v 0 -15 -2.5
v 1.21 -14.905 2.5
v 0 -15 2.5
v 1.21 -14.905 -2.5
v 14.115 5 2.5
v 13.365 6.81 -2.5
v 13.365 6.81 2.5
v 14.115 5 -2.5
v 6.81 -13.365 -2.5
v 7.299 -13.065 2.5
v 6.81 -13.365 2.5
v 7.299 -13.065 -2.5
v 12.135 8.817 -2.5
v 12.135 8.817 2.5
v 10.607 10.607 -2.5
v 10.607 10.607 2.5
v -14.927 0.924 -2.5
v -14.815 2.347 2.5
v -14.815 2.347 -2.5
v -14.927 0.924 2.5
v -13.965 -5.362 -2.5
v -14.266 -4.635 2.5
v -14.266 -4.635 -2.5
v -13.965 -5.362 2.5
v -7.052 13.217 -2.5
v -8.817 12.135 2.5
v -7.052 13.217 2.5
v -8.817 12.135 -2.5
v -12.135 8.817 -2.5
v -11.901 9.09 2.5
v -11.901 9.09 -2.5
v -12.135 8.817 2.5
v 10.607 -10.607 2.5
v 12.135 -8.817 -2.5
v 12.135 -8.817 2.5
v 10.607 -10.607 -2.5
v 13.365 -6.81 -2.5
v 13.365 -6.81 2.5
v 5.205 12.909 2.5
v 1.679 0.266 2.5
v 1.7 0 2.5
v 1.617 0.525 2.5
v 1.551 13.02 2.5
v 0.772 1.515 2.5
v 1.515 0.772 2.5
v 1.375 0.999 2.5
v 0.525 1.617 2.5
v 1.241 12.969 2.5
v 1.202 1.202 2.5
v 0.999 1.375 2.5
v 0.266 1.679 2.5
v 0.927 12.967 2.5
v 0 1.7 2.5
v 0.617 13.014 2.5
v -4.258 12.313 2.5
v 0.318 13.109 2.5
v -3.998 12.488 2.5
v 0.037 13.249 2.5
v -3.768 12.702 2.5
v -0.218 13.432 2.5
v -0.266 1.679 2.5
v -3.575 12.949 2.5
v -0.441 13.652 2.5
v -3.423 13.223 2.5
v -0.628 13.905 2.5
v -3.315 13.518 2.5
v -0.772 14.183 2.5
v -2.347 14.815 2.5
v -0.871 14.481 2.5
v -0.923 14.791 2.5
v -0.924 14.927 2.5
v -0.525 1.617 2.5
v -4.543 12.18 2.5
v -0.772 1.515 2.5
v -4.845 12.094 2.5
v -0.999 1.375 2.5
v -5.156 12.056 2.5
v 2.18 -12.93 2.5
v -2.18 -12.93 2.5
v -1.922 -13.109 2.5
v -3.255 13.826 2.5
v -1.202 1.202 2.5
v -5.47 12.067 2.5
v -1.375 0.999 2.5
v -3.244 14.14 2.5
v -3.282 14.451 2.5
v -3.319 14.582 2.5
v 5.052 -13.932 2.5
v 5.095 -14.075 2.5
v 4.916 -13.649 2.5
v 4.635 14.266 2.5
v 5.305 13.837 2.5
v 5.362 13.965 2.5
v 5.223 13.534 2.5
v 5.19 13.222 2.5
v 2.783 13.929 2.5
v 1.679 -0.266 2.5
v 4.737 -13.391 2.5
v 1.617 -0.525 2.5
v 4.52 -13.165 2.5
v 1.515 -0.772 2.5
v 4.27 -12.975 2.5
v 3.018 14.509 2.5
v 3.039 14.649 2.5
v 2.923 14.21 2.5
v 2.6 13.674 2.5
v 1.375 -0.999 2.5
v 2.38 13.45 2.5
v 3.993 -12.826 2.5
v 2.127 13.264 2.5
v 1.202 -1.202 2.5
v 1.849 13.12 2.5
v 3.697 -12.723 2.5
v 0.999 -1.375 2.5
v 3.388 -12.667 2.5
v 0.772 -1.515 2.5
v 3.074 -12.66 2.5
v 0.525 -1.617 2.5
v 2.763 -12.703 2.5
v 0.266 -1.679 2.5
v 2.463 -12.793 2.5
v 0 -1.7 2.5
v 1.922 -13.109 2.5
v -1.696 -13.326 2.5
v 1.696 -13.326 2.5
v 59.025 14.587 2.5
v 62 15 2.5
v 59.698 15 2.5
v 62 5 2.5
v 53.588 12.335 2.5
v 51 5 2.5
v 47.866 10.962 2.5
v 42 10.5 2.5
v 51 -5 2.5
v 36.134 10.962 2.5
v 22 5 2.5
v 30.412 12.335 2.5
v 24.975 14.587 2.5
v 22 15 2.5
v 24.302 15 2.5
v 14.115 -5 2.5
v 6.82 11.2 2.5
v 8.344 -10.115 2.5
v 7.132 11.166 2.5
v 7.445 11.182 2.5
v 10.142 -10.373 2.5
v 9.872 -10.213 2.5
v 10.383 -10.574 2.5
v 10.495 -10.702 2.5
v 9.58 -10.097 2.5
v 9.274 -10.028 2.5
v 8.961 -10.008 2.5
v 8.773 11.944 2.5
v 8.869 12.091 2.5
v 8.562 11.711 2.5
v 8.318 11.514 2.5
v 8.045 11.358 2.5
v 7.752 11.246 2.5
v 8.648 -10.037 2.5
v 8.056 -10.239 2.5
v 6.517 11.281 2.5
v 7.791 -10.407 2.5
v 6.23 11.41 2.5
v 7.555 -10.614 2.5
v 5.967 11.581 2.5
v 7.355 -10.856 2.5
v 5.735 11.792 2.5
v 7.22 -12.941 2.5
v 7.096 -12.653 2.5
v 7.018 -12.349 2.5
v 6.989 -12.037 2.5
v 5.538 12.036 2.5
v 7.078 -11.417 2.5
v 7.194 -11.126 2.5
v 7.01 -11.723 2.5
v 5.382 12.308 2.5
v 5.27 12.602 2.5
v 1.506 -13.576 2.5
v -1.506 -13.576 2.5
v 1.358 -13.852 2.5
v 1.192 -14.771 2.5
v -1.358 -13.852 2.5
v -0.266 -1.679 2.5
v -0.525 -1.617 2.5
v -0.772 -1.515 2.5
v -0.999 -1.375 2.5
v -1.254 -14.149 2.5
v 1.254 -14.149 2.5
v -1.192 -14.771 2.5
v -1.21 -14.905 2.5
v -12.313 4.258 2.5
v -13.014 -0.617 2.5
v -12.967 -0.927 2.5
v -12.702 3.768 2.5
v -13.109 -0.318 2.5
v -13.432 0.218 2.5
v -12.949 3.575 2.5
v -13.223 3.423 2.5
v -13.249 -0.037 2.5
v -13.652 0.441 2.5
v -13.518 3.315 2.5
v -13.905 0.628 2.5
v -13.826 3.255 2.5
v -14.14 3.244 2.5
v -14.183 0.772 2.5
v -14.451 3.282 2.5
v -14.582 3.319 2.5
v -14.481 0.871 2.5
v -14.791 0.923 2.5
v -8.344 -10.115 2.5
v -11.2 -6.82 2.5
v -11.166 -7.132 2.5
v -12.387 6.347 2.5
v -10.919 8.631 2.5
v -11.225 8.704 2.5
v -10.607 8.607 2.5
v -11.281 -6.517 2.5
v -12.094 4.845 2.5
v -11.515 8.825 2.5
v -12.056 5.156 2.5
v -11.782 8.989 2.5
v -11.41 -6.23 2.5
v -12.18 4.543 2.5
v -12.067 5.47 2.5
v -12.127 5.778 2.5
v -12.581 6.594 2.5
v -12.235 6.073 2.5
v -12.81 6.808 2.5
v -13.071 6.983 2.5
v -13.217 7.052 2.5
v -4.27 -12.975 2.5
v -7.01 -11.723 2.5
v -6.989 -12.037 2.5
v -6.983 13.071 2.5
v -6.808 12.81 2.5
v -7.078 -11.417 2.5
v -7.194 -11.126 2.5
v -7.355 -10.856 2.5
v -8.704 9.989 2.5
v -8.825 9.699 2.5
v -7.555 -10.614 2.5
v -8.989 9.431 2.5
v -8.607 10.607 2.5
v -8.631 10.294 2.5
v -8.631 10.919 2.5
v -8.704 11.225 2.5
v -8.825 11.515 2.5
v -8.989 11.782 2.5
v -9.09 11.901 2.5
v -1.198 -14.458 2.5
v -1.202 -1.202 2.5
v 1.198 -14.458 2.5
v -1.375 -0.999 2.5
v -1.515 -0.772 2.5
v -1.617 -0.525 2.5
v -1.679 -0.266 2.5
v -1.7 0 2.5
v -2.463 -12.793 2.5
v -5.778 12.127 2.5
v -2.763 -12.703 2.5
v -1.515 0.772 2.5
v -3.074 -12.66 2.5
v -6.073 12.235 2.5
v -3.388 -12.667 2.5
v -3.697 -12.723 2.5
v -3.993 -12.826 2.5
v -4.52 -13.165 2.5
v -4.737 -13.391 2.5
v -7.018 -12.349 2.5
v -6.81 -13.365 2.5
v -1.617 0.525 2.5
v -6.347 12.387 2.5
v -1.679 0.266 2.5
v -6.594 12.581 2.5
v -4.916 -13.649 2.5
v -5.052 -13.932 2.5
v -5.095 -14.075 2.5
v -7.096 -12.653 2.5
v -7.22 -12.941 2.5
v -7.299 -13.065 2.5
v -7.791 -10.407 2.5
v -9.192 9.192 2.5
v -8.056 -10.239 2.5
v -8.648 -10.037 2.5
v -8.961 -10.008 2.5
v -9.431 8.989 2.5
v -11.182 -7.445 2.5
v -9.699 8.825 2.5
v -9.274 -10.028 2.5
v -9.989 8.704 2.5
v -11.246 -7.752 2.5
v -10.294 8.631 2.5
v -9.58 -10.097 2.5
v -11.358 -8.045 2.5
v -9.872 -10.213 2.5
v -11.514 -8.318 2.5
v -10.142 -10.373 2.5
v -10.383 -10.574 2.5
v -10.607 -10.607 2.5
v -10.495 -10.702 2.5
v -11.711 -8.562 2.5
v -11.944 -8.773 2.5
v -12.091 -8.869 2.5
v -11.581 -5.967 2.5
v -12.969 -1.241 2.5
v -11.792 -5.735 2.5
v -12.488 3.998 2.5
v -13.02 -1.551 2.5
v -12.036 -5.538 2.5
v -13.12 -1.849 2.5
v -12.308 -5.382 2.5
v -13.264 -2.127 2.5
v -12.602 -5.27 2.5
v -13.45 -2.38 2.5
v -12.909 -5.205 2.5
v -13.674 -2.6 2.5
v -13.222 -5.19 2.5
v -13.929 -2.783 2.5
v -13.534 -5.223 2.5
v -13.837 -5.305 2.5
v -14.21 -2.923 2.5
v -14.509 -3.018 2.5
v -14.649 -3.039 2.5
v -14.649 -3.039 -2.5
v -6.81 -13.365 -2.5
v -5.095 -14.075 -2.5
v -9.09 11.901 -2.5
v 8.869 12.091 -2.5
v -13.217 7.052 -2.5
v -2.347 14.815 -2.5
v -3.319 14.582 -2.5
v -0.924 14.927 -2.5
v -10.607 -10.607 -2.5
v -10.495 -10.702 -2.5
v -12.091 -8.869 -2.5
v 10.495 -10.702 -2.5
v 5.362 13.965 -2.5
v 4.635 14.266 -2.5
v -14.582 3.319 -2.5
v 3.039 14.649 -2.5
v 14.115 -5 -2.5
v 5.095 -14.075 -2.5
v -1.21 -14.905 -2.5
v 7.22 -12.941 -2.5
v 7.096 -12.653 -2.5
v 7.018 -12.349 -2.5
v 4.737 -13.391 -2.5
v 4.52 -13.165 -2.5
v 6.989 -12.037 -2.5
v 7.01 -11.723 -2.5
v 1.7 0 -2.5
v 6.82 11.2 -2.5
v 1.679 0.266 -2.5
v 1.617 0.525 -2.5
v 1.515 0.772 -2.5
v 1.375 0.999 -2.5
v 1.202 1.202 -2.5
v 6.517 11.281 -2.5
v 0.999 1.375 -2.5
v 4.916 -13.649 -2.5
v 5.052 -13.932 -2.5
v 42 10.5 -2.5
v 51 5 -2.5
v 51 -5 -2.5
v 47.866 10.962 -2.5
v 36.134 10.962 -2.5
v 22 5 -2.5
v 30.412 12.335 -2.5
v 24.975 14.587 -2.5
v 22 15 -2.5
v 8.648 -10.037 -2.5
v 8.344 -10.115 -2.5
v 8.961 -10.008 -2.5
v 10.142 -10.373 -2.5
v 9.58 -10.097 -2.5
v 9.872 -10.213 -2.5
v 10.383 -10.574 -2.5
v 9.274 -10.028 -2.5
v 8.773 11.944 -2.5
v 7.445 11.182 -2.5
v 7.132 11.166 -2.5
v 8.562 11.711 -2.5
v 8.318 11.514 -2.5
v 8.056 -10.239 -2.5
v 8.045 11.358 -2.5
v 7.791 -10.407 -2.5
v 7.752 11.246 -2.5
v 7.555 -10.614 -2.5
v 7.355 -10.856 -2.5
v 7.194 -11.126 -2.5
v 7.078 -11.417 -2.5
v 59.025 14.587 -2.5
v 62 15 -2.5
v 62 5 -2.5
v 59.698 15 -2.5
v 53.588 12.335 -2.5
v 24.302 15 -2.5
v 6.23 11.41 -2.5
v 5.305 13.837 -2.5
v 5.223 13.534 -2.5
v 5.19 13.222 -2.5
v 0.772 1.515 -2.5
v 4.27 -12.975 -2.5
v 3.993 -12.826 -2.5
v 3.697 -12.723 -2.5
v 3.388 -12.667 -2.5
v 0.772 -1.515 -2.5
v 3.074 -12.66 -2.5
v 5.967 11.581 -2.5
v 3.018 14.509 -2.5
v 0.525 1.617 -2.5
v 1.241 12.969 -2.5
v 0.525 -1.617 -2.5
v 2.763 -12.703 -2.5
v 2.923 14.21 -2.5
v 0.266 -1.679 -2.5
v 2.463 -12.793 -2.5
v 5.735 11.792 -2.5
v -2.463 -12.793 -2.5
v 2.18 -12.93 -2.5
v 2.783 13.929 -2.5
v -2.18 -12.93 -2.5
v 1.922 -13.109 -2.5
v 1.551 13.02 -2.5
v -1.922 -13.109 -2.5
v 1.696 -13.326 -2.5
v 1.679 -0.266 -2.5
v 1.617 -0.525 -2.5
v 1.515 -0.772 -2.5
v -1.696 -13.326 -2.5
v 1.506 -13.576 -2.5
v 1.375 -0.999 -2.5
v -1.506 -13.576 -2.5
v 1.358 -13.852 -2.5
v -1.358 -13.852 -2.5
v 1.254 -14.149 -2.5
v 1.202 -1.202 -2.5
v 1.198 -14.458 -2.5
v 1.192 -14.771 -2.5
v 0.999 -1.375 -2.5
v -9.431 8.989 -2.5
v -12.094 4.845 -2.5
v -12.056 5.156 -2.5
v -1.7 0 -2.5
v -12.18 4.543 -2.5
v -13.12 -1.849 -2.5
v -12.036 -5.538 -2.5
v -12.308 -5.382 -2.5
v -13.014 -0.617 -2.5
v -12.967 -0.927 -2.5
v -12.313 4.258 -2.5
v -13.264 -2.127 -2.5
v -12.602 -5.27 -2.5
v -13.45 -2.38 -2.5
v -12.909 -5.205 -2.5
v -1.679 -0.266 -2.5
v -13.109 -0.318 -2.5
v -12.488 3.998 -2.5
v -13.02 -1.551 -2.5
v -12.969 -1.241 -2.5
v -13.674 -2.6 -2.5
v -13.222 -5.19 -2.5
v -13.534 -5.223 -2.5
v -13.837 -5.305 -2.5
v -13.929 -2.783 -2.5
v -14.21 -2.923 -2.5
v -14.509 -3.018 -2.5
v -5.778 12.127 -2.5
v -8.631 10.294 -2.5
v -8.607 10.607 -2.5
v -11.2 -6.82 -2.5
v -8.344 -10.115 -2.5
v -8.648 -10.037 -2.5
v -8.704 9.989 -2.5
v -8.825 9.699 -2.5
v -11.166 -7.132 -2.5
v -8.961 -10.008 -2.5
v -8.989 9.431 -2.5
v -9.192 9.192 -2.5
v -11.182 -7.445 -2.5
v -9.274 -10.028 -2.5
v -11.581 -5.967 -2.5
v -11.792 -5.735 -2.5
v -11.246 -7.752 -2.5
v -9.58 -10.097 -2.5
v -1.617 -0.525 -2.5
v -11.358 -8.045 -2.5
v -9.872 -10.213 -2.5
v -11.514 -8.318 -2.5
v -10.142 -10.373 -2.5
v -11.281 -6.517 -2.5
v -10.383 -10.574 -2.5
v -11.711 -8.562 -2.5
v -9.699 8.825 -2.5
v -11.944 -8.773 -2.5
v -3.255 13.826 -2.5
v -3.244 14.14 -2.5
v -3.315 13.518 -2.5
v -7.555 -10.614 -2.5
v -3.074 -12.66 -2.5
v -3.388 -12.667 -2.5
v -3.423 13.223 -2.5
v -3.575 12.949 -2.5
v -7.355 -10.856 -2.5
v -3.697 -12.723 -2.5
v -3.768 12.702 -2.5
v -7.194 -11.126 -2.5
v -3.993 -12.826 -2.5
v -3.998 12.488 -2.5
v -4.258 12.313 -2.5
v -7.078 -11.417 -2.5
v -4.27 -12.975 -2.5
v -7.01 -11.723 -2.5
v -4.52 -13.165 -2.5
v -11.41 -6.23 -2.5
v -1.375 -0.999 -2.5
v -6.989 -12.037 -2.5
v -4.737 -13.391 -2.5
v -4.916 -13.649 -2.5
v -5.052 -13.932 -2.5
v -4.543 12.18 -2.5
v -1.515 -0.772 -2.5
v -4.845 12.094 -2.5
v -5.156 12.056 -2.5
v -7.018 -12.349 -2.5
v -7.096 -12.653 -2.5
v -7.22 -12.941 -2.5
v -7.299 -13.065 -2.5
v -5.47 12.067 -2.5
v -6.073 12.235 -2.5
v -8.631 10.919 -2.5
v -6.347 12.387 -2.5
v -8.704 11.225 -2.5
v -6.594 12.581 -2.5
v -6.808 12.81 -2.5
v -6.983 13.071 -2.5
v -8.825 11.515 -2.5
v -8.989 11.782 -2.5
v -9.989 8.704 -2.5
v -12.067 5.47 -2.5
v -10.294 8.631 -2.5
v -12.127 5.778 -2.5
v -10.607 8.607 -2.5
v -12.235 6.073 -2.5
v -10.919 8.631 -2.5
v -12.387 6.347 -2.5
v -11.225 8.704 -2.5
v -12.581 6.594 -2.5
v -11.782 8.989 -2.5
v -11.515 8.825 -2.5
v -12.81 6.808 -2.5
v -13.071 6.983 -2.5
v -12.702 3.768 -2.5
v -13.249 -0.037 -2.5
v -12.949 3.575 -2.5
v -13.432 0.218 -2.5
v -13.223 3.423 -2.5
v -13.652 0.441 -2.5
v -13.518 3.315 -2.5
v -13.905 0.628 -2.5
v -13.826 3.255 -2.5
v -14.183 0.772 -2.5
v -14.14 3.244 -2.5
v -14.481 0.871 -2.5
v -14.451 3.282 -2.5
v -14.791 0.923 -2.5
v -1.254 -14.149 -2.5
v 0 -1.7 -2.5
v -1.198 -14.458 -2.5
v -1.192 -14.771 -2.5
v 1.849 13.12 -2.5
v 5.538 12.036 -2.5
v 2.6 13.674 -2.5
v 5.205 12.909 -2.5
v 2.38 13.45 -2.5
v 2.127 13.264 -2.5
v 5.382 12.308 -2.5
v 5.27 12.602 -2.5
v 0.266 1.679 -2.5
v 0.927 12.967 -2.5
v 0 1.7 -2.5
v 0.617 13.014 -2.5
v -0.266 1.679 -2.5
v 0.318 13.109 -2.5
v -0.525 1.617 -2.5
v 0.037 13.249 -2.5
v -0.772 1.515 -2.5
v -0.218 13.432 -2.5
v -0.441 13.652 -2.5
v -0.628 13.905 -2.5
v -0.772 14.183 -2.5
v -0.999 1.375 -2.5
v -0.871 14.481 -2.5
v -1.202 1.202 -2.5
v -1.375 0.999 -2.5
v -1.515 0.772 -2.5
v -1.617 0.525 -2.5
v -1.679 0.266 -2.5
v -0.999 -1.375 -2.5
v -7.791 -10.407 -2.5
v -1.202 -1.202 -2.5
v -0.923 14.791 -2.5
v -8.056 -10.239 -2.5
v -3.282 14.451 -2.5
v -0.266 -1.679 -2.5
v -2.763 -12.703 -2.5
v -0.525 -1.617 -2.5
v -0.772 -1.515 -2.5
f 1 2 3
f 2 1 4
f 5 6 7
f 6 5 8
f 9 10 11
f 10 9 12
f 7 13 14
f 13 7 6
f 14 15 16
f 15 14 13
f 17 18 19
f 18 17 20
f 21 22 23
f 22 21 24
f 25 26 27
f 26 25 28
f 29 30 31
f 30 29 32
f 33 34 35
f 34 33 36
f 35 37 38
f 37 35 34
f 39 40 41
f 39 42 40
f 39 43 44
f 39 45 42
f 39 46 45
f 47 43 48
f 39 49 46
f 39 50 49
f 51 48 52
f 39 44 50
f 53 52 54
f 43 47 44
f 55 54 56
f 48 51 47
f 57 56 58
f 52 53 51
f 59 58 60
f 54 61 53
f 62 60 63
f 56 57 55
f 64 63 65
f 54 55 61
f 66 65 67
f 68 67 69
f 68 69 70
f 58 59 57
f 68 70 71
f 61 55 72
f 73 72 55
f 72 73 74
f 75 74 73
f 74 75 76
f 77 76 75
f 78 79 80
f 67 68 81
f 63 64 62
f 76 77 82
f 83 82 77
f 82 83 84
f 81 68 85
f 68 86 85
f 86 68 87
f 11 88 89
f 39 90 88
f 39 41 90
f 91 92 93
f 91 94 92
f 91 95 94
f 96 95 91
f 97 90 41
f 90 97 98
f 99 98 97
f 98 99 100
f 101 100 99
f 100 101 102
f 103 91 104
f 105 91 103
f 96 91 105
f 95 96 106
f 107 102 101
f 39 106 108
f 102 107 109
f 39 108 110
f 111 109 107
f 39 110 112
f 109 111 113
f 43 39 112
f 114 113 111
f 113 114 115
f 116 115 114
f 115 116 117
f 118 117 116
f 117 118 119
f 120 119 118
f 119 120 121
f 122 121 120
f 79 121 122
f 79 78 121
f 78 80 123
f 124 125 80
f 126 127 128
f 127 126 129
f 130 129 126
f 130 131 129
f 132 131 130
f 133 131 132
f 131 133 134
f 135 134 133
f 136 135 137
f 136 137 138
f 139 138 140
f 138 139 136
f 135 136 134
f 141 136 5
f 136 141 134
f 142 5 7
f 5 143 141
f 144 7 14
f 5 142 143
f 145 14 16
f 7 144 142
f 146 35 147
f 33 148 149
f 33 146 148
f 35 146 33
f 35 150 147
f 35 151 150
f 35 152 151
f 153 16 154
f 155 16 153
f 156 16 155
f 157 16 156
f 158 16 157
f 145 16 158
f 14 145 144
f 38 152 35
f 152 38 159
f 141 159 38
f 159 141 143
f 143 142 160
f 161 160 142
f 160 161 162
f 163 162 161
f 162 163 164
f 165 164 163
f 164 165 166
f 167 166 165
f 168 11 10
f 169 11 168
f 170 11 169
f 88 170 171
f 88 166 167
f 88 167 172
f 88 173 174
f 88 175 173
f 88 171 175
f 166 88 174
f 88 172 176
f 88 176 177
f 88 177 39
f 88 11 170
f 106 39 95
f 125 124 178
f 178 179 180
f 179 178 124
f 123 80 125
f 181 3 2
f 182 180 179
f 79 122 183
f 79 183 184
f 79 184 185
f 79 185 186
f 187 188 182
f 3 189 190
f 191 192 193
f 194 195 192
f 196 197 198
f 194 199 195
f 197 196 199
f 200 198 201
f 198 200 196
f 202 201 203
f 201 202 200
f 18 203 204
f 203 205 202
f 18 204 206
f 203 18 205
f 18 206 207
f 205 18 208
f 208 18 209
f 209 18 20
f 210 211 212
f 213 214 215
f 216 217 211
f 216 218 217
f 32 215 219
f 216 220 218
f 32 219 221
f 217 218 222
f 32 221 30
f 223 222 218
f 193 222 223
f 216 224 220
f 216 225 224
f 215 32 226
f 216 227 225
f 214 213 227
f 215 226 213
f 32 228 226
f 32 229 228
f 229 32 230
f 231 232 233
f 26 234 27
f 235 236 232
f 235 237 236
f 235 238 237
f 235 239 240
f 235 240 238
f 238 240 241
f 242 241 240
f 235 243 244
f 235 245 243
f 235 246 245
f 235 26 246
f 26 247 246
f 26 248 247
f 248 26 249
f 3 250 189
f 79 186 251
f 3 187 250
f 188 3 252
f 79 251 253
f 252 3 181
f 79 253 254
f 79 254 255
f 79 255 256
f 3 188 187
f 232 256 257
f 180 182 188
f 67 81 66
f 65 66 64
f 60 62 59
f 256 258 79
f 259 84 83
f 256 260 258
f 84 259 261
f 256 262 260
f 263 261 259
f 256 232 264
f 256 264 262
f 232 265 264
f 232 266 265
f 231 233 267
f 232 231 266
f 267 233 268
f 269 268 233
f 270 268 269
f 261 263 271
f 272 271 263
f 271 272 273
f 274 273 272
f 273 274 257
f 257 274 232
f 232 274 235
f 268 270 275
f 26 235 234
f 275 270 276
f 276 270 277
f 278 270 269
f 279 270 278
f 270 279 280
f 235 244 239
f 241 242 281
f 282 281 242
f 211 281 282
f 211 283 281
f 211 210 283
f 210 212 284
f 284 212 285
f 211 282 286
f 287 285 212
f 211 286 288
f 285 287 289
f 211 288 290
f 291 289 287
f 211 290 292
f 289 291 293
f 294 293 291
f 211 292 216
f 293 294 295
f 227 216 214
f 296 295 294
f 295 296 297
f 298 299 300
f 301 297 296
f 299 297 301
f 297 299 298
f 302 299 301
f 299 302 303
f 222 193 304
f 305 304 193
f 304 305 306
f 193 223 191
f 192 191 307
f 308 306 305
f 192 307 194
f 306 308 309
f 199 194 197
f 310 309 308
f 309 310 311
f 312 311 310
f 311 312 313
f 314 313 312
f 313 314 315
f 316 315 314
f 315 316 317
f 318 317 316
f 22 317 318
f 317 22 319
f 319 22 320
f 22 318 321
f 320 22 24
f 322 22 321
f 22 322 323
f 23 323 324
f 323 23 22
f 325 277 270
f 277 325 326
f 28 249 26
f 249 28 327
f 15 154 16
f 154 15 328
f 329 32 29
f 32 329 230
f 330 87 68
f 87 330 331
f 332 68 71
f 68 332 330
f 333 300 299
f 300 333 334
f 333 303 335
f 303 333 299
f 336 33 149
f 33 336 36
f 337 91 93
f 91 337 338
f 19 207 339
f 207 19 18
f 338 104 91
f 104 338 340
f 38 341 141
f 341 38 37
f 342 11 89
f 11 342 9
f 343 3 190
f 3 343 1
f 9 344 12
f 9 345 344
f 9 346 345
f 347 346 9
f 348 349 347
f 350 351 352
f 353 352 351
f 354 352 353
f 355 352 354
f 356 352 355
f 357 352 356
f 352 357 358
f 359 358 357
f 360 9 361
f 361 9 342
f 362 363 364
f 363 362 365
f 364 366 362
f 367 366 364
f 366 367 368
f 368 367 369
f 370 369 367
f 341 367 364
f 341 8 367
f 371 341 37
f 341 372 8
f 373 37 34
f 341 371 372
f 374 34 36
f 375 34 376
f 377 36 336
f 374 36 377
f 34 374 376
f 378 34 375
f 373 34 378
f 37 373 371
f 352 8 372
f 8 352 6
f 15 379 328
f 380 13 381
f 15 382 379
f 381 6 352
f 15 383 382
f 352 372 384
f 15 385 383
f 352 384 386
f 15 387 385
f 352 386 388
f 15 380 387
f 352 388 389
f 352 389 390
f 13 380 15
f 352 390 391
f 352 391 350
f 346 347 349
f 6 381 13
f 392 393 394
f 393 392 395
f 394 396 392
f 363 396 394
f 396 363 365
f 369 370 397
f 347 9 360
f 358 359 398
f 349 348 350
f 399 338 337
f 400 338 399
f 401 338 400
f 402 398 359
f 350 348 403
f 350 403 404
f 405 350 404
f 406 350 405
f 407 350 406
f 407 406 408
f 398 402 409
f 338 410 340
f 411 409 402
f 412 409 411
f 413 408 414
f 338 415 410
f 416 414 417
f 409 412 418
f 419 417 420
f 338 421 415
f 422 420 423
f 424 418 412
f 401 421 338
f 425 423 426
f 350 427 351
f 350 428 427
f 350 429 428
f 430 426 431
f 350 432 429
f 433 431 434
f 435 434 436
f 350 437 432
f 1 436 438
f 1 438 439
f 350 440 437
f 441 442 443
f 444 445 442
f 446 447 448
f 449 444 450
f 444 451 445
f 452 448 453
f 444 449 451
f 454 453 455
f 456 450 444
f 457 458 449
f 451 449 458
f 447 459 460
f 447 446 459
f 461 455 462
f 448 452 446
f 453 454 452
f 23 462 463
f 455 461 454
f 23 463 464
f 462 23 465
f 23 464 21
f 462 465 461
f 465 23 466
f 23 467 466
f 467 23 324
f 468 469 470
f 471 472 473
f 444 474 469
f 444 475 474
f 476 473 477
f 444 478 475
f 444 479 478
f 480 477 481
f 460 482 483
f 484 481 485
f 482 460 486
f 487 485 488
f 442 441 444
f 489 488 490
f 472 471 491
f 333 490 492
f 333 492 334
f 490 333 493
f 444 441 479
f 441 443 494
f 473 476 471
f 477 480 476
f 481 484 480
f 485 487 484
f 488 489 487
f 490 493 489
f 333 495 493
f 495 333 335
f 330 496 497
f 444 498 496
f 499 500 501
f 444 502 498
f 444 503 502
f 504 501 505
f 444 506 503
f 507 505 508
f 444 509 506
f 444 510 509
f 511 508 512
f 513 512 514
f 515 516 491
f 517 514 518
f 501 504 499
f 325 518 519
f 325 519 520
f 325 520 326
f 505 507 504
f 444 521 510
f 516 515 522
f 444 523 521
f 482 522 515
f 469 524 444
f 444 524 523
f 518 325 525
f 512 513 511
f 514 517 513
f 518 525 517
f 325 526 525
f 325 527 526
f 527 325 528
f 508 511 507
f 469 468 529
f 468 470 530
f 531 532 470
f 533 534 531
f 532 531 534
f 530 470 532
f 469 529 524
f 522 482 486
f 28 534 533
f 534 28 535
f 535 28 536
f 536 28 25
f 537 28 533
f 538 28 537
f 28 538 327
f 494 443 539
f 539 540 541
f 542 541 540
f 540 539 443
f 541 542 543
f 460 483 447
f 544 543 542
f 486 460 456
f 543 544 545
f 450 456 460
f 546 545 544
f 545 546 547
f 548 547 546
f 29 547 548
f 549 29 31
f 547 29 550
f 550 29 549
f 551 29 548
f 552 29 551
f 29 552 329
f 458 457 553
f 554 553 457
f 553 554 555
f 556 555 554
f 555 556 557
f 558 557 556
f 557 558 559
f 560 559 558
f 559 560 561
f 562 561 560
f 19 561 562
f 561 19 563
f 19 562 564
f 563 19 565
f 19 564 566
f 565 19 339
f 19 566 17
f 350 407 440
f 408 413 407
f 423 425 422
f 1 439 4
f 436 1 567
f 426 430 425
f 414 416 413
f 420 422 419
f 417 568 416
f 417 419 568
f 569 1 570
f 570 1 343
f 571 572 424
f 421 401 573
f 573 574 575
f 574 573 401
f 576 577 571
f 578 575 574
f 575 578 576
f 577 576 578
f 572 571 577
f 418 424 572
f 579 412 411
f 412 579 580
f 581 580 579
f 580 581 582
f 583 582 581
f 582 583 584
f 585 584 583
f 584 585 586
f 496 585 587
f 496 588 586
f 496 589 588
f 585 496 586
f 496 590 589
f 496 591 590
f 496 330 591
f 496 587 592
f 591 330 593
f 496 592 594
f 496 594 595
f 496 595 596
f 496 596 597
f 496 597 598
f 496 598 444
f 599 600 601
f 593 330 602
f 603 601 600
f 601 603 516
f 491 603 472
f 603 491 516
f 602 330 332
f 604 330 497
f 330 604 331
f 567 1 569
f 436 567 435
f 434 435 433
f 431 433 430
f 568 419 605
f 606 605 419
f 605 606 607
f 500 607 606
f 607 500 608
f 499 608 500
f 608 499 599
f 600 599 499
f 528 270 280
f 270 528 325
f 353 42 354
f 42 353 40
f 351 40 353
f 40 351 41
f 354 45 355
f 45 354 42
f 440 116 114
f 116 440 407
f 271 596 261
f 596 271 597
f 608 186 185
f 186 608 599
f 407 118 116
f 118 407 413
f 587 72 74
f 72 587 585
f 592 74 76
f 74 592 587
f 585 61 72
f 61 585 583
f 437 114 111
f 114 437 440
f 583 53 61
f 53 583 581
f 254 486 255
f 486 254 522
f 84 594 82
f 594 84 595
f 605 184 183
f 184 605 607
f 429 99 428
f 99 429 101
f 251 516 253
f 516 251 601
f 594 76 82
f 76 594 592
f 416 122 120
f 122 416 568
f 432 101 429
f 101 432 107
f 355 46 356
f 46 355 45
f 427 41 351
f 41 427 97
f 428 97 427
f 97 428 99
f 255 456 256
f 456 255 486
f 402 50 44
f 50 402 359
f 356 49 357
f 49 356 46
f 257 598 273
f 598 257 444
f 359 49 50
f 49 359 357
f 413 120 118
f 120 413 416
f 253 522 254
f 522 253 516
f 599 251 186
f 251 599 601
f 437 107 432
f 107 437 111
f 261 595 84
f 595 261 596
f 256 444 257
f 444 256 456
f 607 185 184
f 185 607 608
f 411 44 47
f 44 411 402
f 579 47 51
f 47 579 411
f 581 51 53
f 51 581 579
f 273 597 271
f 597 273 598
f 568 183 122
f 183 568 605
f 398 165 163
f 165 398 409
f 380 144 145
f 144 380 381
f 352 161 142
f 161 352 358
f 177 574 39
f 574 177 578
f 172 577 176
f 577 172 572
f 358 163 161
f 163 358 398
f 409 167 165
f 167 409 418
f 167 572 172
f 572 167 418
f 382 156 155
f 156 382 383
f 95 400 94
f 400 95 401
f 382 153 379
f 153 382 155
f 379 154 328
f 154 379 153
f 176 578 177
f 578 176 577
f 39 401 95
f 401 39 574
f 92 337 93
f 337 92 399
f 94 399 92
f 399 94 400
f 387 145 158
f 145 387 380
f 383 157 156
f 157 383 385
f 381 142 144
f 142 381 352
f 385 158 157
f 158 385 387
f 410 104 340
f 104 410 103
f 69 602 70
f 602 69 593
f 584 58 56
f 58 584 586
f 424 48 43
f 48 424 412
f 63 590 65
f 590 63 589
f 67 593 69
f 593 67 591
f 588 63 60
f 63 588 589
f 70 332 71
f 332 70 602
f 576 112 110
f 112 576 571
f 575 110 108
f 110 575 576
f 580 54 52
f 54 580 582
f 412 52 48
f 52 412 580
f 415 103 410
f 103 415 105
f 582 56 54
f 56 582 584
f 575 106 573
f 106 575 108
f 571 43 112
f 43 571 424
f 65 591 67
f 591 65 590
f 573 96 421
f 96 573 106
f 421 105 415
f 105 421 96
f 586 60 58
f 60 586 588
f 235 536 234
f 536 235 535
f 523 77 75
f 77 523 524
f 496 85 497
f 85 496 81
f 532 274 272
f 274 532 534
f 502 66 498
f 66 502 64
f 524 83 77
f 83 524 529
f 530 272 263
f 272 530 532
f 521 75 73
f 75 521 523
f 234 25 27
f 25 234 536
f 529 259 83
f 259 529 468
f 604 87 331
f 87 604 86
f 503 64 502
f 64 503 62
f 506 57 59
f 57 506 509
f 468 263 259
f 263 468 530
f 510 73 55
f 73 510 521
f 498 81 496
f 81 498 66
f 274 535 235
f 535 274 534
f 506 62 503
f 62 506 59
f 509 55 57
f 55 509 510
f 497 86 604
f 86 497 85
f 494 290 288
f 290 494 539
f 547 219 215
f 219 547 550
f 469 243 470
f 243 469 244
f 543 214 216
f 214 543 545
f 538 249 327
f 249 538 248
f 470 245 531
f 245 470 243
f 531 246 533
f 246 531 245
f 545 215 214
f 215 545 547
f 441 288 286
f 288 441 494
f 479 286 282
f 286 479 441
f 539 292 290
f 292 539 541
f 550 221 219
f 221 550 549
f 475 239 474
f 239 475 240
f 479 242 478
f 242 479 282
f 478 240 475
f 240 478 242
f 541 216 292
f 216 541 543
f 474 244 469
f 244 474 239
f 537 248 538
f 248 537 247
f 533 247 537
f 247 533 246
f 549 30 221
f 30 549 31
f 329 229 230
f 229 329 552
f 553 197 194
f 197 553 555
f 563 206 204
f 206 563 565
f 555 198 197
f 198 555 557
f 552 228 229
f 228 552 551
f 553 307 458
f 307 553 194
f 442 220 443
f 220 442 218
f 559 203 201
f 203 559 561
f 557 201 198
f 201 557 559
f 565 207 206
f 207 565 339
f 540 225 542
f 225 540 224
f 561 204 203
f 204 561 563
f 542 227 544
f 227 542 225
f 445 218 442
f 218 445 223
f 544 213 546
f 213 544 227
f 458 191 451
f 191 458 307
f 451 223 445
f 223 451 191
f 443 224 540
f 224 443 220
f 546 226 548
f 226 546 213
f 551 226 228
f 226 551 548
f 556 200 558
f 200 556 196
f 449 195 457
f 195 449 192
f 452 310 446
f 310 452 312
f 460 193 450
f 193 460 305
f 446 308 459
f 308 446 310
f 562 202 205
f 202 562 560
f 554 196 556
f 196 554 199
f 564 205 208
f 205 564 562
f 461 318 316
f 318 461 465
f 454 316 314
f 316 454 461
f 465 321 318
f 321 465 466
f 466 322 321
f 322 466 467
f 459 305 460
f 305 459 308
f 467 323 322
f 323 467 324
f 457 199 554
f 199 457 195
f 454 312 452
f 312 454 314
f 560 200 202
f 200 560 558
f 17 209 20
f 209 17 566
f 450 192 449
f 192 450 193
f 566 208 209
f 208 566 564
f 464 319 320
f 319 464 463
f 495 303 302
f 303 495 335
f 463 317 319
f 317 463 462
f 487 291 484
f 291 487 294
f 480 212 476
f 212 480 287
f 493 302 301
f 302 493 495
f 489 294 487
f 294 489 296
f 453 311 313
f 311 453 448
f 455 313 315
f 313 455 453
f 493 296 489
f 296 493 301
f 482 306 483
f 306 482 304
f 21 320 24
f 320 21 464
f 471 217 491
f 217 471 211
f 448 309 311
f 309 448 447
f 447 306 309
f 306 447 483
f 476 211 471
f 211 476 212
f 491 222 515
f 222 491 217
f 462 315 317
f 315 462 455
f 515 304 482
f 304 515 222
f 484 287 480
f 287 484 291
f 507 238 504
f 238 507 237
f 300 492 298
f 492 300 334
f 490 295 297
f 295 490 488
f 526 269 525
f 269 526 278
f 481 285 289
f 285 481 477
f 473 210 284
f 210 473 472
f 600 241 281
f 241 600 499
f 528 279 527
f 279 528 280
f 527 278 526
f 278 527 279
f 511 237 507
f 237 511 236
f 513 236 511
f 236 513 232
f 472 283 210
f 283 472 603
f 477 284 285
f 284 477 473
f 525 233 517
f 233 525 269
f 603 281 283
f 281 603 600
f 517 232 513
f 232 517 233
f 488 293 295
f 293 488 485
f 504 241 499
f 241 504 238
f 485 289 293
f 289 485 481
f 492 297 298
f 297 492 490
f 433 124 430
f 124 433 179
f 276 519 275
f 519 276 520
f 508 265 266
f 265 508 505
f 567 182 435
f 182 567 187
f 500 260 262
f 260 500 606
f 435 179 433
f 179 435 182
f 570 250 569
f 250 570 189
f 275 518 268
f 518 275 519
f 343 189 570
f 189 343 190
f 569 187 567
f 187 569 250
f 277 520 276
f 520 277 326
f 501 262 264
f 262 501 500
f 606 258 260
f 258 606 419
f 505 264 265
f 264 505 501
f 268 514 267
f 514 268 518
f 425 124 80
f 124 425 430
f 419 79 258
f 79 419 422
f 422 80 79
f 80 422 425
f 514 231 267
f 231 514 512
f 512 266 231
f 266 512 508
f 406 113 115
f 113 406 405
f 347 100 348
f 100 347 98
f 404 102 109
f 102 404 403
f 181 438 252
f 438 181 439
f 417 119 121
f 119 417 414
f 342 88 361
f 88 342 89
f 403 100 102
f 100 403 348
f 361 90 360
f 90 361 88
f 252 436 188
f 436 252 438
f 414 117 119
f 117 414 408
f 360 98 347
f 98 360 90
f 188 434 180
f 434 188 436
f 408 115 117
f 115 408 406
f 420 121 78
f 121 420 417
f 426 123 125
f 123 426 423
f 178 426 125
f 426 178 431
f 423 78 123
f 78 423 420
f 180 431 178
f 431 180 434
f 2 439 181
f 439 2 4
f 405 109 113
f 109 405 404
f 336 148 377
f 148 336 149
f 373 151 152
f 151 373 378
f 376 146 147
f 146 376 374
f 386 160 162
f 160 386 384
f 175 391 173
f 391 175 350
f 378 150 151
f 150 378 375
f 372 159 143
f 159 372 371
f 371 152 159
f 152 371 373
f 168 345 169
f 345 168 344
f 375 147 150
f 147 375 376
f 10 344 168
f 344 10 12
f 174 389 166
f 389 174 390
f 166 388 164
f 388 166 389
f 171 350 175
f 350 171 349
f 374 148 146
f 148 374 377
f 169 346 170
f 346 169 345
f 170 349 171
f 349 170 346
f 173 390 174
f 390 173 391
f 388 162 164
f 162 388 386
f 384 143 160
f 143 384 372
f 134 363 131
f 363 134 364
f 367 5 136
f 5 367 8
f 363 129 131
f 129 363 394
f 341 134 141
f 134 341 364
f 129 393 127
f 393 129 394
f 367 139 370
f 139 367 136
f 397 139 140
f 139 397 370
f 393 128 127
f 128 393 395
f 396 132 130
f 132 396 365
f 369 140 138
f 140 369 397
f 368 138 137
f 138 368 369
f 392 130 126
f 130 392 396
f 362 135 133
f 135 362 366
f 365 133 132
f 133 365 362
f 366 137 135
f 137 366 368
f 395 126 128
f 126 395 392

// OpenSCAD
//Author: Piotr Paterek, Kraków 05-08.2016
$fn=40;
module claw()
{

    difference()
    {
        difference()
        {
            cylinder(r=15,h=5, center=true);
            cylinder(r=1.7,h=5, center=true);
        }
        
            for(i=[2.5:1:12.5])
            {
                rotate(a=i*270/11, v=[0,0,1])
                {
                    translate([15,0,0])
        {
                    
                        cylinder(r=2,h=5.2, center=true);
        }
                }
            }
    }
   


translate([31,0,0])
{
    cube([40,10,5], center=true);
}
translate([42,10,0])
{
    cube([40,10,5], center=true);
}
}


        difference()
        {
            claw();
            translate([42,48,0])
            {
                cylinder(r=37.5, h=6, center=true);
            }
        }
    
